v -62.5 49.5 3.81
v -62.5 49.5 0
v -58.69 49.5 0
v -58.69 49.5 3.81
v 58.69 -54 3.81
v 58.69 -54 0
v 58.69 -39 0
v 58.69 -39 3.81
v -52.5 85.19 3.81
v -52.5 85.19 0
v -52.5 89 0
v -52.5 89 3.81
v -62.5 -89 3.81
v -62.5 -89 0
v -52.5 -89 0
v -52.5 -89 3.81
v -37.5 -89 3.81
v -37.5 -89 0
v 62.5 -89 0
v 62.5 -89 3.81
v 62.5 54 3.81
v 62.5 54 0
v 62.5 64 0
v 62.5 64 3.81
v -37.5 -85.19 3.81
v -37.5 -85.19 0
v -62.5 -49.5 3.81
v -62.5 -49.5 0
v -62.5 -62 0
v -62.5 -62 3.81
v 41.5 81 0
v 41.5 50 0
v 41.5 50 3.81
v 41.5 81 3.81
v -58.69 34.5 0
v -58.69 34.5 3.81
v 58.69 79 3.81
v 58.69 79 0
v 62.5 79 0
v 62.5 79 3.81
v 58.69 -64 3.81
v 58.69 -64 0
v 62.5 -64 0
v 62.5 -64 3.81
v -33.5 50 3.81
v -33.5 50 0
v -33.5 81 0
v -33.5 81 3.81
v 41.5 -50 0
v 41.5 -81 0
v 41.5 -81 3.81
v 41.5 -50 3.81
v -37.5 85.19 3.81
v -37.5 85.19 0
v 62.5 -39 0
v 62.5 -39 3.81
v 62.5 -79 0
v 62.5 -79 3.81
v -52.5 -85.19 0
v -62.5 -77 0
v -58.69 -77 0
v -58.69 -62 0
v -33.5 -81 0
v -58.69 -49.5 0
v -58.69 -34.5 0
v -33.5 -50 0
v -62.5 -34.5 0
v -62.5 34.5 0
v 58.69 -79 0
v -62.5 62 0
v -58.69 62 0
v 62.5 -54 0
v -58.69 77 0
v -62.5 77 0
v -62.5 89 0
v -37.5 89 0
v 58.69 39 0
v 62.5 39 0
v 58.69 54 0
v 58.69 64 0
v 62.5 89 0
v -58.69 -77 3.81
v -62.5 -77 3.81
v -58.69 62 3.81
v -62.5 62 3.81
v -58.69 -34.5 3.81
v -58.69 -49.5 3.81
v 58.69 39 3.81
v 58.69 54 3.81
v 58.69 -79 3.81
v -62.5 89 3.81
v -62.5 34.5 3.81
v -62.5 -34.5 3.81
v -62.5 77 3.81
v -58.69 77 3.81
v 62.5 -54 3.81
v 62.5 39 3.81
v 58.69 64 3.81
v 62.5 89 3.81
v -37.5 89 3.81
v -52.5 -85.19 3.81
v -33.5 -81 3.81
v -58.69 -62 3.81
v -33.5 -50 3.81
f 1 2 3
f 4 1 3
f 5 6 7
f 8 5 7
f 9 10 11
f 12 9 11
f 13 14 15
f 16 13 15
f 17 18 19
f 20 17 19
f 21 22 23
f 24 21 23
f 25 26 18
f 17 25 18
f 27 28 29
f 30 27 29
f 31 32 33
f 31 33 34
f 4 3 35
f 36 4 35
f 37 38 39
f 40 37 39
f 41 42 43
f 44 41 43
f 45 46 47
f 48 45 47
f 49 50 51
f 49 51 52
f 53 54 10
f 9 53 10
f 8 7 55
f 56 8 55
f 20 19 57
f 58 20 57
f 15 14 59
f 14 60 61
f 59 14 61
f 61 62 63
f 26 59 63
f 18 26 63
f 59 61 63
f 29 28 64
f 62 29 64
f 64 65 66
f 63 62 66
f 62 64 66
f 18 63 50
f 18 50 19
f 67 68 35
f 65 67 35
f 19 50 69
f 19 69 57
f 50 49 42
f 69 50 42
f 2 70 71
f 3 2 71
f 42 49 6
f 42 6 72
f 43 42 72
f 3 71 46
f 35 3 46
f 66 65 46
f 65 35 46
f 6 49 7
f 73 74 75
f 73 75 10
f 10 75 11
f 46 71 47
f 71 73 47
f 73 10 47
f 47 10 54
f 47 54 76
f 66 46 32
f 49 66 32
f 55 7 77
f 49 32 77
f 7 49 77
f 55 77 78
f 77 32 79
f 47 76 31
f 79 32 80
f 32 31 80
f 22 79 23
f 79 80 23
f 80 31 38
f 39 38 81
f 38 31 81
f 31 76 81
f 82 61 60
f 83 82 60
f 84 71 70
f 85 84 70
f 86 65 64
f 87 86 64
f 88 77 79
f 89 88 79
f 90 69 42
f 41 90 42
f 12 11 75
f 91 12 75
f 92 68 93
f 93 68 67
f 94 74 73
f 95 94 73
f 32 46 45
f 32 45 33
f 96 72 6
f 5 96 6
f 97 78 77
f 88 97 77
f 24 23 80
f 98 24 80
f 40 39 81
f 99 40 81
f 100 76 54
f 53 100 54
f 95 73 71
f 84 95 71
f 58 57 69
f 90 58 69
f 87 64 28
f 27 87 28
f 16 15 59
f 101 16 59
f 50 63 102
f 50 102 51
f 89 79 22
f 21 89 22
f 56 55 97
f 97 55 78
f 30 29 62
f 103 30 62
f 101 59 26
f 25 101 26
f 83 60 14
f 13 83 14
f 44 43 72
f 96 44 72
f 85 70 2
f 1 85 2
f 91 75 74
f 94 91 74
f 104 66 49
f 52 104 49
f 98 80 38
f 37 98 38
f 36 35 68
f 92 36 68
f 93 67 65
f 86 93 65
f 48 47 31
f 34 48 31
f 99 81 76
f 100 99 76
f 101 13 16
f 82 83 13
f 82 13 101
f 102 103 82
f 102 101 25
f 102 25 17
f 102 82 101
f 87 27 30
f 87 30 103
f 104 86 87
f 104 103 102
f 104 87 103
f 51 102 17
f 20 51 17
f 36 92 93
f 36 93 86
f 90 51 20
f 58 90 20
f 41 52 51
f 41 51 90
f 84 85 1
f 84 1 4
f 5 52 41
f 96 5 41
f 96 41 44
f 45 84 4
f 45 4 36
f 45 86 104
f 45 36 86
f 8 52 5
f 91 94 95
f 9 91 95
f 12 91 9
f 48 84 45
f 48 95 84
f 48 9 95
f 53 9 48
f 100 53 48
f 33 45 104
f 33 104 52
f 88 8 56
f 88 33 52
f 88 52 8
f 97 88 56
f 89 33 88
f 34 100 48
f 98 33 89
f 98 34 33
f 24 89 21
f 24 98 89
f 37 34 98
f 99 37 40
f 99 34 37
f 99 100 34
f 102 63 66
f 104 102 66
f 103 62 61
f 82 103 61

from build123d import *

# Parameters (mm, degrees)
F0_W     = 75
F0_H     = 31
F1_DEPTH = 3.81


with BuildPart() as f1:
    # F0 (on Top) → F1 (new body)
    with BuildSketch(Plane.XY):
        Polygon((62.5, 79), (62.5, 89), (-37.5, 89), (-37.5, 85.19), (-52.5, 85.19), (-52.5, 89), (-62.5, 89), (-62.5, 77), (-58.69, 77), (-58.69, 62), (-62.5, 62), (-62.5, 49.5), (-58.69, 49.5), (-58.69, 34.5), (-62.5, 34.5), (-62.5, 22.5), (-38.5, 22.5), (-38.5, 0), (-38.5, -22.5), (-62.5, -22.5), (-62.5, -34.5), (-58.69, -34.5), (-58.69, -49.5), (-62.5, -49.5), (-62.5, -62), (-58.69, -62), (-58.69, -77), (-62.5, -77), (-62.5, -89), (-52.5, -89), (-52.5, -85.19), (-37.5, -85.19), (-37.5, -89), (62.5, -89), (62.5, -79), (58.69, -79), (58.69, -64), (62.5, -64), (62.5, -54), (58.69, -54), (58.69, -39), (62.5, -39), (62.5, 39), (58.69, 39), (58.69, 54), (62.5, 54), (62.5, 64), (58.69, 64), (58.69, 79), align=None)
        with Locations((4, -65.5)):
            Rectangle(F0_W, F0_H, mode=Mode.SUBTRACT)
        with Locations((4, 65.5)):
            Rectangle(F0_W, F0_H, mode=Mode.SUBTRACT)
        Polygon((-38.5, 22.5), (-62.5, 22.5), (-62.5, -22.5), (-38.5, -22.5), (-38.5, 0), align=None)
    extrude(amount=F1_DEPTH)


solid = f1.part
